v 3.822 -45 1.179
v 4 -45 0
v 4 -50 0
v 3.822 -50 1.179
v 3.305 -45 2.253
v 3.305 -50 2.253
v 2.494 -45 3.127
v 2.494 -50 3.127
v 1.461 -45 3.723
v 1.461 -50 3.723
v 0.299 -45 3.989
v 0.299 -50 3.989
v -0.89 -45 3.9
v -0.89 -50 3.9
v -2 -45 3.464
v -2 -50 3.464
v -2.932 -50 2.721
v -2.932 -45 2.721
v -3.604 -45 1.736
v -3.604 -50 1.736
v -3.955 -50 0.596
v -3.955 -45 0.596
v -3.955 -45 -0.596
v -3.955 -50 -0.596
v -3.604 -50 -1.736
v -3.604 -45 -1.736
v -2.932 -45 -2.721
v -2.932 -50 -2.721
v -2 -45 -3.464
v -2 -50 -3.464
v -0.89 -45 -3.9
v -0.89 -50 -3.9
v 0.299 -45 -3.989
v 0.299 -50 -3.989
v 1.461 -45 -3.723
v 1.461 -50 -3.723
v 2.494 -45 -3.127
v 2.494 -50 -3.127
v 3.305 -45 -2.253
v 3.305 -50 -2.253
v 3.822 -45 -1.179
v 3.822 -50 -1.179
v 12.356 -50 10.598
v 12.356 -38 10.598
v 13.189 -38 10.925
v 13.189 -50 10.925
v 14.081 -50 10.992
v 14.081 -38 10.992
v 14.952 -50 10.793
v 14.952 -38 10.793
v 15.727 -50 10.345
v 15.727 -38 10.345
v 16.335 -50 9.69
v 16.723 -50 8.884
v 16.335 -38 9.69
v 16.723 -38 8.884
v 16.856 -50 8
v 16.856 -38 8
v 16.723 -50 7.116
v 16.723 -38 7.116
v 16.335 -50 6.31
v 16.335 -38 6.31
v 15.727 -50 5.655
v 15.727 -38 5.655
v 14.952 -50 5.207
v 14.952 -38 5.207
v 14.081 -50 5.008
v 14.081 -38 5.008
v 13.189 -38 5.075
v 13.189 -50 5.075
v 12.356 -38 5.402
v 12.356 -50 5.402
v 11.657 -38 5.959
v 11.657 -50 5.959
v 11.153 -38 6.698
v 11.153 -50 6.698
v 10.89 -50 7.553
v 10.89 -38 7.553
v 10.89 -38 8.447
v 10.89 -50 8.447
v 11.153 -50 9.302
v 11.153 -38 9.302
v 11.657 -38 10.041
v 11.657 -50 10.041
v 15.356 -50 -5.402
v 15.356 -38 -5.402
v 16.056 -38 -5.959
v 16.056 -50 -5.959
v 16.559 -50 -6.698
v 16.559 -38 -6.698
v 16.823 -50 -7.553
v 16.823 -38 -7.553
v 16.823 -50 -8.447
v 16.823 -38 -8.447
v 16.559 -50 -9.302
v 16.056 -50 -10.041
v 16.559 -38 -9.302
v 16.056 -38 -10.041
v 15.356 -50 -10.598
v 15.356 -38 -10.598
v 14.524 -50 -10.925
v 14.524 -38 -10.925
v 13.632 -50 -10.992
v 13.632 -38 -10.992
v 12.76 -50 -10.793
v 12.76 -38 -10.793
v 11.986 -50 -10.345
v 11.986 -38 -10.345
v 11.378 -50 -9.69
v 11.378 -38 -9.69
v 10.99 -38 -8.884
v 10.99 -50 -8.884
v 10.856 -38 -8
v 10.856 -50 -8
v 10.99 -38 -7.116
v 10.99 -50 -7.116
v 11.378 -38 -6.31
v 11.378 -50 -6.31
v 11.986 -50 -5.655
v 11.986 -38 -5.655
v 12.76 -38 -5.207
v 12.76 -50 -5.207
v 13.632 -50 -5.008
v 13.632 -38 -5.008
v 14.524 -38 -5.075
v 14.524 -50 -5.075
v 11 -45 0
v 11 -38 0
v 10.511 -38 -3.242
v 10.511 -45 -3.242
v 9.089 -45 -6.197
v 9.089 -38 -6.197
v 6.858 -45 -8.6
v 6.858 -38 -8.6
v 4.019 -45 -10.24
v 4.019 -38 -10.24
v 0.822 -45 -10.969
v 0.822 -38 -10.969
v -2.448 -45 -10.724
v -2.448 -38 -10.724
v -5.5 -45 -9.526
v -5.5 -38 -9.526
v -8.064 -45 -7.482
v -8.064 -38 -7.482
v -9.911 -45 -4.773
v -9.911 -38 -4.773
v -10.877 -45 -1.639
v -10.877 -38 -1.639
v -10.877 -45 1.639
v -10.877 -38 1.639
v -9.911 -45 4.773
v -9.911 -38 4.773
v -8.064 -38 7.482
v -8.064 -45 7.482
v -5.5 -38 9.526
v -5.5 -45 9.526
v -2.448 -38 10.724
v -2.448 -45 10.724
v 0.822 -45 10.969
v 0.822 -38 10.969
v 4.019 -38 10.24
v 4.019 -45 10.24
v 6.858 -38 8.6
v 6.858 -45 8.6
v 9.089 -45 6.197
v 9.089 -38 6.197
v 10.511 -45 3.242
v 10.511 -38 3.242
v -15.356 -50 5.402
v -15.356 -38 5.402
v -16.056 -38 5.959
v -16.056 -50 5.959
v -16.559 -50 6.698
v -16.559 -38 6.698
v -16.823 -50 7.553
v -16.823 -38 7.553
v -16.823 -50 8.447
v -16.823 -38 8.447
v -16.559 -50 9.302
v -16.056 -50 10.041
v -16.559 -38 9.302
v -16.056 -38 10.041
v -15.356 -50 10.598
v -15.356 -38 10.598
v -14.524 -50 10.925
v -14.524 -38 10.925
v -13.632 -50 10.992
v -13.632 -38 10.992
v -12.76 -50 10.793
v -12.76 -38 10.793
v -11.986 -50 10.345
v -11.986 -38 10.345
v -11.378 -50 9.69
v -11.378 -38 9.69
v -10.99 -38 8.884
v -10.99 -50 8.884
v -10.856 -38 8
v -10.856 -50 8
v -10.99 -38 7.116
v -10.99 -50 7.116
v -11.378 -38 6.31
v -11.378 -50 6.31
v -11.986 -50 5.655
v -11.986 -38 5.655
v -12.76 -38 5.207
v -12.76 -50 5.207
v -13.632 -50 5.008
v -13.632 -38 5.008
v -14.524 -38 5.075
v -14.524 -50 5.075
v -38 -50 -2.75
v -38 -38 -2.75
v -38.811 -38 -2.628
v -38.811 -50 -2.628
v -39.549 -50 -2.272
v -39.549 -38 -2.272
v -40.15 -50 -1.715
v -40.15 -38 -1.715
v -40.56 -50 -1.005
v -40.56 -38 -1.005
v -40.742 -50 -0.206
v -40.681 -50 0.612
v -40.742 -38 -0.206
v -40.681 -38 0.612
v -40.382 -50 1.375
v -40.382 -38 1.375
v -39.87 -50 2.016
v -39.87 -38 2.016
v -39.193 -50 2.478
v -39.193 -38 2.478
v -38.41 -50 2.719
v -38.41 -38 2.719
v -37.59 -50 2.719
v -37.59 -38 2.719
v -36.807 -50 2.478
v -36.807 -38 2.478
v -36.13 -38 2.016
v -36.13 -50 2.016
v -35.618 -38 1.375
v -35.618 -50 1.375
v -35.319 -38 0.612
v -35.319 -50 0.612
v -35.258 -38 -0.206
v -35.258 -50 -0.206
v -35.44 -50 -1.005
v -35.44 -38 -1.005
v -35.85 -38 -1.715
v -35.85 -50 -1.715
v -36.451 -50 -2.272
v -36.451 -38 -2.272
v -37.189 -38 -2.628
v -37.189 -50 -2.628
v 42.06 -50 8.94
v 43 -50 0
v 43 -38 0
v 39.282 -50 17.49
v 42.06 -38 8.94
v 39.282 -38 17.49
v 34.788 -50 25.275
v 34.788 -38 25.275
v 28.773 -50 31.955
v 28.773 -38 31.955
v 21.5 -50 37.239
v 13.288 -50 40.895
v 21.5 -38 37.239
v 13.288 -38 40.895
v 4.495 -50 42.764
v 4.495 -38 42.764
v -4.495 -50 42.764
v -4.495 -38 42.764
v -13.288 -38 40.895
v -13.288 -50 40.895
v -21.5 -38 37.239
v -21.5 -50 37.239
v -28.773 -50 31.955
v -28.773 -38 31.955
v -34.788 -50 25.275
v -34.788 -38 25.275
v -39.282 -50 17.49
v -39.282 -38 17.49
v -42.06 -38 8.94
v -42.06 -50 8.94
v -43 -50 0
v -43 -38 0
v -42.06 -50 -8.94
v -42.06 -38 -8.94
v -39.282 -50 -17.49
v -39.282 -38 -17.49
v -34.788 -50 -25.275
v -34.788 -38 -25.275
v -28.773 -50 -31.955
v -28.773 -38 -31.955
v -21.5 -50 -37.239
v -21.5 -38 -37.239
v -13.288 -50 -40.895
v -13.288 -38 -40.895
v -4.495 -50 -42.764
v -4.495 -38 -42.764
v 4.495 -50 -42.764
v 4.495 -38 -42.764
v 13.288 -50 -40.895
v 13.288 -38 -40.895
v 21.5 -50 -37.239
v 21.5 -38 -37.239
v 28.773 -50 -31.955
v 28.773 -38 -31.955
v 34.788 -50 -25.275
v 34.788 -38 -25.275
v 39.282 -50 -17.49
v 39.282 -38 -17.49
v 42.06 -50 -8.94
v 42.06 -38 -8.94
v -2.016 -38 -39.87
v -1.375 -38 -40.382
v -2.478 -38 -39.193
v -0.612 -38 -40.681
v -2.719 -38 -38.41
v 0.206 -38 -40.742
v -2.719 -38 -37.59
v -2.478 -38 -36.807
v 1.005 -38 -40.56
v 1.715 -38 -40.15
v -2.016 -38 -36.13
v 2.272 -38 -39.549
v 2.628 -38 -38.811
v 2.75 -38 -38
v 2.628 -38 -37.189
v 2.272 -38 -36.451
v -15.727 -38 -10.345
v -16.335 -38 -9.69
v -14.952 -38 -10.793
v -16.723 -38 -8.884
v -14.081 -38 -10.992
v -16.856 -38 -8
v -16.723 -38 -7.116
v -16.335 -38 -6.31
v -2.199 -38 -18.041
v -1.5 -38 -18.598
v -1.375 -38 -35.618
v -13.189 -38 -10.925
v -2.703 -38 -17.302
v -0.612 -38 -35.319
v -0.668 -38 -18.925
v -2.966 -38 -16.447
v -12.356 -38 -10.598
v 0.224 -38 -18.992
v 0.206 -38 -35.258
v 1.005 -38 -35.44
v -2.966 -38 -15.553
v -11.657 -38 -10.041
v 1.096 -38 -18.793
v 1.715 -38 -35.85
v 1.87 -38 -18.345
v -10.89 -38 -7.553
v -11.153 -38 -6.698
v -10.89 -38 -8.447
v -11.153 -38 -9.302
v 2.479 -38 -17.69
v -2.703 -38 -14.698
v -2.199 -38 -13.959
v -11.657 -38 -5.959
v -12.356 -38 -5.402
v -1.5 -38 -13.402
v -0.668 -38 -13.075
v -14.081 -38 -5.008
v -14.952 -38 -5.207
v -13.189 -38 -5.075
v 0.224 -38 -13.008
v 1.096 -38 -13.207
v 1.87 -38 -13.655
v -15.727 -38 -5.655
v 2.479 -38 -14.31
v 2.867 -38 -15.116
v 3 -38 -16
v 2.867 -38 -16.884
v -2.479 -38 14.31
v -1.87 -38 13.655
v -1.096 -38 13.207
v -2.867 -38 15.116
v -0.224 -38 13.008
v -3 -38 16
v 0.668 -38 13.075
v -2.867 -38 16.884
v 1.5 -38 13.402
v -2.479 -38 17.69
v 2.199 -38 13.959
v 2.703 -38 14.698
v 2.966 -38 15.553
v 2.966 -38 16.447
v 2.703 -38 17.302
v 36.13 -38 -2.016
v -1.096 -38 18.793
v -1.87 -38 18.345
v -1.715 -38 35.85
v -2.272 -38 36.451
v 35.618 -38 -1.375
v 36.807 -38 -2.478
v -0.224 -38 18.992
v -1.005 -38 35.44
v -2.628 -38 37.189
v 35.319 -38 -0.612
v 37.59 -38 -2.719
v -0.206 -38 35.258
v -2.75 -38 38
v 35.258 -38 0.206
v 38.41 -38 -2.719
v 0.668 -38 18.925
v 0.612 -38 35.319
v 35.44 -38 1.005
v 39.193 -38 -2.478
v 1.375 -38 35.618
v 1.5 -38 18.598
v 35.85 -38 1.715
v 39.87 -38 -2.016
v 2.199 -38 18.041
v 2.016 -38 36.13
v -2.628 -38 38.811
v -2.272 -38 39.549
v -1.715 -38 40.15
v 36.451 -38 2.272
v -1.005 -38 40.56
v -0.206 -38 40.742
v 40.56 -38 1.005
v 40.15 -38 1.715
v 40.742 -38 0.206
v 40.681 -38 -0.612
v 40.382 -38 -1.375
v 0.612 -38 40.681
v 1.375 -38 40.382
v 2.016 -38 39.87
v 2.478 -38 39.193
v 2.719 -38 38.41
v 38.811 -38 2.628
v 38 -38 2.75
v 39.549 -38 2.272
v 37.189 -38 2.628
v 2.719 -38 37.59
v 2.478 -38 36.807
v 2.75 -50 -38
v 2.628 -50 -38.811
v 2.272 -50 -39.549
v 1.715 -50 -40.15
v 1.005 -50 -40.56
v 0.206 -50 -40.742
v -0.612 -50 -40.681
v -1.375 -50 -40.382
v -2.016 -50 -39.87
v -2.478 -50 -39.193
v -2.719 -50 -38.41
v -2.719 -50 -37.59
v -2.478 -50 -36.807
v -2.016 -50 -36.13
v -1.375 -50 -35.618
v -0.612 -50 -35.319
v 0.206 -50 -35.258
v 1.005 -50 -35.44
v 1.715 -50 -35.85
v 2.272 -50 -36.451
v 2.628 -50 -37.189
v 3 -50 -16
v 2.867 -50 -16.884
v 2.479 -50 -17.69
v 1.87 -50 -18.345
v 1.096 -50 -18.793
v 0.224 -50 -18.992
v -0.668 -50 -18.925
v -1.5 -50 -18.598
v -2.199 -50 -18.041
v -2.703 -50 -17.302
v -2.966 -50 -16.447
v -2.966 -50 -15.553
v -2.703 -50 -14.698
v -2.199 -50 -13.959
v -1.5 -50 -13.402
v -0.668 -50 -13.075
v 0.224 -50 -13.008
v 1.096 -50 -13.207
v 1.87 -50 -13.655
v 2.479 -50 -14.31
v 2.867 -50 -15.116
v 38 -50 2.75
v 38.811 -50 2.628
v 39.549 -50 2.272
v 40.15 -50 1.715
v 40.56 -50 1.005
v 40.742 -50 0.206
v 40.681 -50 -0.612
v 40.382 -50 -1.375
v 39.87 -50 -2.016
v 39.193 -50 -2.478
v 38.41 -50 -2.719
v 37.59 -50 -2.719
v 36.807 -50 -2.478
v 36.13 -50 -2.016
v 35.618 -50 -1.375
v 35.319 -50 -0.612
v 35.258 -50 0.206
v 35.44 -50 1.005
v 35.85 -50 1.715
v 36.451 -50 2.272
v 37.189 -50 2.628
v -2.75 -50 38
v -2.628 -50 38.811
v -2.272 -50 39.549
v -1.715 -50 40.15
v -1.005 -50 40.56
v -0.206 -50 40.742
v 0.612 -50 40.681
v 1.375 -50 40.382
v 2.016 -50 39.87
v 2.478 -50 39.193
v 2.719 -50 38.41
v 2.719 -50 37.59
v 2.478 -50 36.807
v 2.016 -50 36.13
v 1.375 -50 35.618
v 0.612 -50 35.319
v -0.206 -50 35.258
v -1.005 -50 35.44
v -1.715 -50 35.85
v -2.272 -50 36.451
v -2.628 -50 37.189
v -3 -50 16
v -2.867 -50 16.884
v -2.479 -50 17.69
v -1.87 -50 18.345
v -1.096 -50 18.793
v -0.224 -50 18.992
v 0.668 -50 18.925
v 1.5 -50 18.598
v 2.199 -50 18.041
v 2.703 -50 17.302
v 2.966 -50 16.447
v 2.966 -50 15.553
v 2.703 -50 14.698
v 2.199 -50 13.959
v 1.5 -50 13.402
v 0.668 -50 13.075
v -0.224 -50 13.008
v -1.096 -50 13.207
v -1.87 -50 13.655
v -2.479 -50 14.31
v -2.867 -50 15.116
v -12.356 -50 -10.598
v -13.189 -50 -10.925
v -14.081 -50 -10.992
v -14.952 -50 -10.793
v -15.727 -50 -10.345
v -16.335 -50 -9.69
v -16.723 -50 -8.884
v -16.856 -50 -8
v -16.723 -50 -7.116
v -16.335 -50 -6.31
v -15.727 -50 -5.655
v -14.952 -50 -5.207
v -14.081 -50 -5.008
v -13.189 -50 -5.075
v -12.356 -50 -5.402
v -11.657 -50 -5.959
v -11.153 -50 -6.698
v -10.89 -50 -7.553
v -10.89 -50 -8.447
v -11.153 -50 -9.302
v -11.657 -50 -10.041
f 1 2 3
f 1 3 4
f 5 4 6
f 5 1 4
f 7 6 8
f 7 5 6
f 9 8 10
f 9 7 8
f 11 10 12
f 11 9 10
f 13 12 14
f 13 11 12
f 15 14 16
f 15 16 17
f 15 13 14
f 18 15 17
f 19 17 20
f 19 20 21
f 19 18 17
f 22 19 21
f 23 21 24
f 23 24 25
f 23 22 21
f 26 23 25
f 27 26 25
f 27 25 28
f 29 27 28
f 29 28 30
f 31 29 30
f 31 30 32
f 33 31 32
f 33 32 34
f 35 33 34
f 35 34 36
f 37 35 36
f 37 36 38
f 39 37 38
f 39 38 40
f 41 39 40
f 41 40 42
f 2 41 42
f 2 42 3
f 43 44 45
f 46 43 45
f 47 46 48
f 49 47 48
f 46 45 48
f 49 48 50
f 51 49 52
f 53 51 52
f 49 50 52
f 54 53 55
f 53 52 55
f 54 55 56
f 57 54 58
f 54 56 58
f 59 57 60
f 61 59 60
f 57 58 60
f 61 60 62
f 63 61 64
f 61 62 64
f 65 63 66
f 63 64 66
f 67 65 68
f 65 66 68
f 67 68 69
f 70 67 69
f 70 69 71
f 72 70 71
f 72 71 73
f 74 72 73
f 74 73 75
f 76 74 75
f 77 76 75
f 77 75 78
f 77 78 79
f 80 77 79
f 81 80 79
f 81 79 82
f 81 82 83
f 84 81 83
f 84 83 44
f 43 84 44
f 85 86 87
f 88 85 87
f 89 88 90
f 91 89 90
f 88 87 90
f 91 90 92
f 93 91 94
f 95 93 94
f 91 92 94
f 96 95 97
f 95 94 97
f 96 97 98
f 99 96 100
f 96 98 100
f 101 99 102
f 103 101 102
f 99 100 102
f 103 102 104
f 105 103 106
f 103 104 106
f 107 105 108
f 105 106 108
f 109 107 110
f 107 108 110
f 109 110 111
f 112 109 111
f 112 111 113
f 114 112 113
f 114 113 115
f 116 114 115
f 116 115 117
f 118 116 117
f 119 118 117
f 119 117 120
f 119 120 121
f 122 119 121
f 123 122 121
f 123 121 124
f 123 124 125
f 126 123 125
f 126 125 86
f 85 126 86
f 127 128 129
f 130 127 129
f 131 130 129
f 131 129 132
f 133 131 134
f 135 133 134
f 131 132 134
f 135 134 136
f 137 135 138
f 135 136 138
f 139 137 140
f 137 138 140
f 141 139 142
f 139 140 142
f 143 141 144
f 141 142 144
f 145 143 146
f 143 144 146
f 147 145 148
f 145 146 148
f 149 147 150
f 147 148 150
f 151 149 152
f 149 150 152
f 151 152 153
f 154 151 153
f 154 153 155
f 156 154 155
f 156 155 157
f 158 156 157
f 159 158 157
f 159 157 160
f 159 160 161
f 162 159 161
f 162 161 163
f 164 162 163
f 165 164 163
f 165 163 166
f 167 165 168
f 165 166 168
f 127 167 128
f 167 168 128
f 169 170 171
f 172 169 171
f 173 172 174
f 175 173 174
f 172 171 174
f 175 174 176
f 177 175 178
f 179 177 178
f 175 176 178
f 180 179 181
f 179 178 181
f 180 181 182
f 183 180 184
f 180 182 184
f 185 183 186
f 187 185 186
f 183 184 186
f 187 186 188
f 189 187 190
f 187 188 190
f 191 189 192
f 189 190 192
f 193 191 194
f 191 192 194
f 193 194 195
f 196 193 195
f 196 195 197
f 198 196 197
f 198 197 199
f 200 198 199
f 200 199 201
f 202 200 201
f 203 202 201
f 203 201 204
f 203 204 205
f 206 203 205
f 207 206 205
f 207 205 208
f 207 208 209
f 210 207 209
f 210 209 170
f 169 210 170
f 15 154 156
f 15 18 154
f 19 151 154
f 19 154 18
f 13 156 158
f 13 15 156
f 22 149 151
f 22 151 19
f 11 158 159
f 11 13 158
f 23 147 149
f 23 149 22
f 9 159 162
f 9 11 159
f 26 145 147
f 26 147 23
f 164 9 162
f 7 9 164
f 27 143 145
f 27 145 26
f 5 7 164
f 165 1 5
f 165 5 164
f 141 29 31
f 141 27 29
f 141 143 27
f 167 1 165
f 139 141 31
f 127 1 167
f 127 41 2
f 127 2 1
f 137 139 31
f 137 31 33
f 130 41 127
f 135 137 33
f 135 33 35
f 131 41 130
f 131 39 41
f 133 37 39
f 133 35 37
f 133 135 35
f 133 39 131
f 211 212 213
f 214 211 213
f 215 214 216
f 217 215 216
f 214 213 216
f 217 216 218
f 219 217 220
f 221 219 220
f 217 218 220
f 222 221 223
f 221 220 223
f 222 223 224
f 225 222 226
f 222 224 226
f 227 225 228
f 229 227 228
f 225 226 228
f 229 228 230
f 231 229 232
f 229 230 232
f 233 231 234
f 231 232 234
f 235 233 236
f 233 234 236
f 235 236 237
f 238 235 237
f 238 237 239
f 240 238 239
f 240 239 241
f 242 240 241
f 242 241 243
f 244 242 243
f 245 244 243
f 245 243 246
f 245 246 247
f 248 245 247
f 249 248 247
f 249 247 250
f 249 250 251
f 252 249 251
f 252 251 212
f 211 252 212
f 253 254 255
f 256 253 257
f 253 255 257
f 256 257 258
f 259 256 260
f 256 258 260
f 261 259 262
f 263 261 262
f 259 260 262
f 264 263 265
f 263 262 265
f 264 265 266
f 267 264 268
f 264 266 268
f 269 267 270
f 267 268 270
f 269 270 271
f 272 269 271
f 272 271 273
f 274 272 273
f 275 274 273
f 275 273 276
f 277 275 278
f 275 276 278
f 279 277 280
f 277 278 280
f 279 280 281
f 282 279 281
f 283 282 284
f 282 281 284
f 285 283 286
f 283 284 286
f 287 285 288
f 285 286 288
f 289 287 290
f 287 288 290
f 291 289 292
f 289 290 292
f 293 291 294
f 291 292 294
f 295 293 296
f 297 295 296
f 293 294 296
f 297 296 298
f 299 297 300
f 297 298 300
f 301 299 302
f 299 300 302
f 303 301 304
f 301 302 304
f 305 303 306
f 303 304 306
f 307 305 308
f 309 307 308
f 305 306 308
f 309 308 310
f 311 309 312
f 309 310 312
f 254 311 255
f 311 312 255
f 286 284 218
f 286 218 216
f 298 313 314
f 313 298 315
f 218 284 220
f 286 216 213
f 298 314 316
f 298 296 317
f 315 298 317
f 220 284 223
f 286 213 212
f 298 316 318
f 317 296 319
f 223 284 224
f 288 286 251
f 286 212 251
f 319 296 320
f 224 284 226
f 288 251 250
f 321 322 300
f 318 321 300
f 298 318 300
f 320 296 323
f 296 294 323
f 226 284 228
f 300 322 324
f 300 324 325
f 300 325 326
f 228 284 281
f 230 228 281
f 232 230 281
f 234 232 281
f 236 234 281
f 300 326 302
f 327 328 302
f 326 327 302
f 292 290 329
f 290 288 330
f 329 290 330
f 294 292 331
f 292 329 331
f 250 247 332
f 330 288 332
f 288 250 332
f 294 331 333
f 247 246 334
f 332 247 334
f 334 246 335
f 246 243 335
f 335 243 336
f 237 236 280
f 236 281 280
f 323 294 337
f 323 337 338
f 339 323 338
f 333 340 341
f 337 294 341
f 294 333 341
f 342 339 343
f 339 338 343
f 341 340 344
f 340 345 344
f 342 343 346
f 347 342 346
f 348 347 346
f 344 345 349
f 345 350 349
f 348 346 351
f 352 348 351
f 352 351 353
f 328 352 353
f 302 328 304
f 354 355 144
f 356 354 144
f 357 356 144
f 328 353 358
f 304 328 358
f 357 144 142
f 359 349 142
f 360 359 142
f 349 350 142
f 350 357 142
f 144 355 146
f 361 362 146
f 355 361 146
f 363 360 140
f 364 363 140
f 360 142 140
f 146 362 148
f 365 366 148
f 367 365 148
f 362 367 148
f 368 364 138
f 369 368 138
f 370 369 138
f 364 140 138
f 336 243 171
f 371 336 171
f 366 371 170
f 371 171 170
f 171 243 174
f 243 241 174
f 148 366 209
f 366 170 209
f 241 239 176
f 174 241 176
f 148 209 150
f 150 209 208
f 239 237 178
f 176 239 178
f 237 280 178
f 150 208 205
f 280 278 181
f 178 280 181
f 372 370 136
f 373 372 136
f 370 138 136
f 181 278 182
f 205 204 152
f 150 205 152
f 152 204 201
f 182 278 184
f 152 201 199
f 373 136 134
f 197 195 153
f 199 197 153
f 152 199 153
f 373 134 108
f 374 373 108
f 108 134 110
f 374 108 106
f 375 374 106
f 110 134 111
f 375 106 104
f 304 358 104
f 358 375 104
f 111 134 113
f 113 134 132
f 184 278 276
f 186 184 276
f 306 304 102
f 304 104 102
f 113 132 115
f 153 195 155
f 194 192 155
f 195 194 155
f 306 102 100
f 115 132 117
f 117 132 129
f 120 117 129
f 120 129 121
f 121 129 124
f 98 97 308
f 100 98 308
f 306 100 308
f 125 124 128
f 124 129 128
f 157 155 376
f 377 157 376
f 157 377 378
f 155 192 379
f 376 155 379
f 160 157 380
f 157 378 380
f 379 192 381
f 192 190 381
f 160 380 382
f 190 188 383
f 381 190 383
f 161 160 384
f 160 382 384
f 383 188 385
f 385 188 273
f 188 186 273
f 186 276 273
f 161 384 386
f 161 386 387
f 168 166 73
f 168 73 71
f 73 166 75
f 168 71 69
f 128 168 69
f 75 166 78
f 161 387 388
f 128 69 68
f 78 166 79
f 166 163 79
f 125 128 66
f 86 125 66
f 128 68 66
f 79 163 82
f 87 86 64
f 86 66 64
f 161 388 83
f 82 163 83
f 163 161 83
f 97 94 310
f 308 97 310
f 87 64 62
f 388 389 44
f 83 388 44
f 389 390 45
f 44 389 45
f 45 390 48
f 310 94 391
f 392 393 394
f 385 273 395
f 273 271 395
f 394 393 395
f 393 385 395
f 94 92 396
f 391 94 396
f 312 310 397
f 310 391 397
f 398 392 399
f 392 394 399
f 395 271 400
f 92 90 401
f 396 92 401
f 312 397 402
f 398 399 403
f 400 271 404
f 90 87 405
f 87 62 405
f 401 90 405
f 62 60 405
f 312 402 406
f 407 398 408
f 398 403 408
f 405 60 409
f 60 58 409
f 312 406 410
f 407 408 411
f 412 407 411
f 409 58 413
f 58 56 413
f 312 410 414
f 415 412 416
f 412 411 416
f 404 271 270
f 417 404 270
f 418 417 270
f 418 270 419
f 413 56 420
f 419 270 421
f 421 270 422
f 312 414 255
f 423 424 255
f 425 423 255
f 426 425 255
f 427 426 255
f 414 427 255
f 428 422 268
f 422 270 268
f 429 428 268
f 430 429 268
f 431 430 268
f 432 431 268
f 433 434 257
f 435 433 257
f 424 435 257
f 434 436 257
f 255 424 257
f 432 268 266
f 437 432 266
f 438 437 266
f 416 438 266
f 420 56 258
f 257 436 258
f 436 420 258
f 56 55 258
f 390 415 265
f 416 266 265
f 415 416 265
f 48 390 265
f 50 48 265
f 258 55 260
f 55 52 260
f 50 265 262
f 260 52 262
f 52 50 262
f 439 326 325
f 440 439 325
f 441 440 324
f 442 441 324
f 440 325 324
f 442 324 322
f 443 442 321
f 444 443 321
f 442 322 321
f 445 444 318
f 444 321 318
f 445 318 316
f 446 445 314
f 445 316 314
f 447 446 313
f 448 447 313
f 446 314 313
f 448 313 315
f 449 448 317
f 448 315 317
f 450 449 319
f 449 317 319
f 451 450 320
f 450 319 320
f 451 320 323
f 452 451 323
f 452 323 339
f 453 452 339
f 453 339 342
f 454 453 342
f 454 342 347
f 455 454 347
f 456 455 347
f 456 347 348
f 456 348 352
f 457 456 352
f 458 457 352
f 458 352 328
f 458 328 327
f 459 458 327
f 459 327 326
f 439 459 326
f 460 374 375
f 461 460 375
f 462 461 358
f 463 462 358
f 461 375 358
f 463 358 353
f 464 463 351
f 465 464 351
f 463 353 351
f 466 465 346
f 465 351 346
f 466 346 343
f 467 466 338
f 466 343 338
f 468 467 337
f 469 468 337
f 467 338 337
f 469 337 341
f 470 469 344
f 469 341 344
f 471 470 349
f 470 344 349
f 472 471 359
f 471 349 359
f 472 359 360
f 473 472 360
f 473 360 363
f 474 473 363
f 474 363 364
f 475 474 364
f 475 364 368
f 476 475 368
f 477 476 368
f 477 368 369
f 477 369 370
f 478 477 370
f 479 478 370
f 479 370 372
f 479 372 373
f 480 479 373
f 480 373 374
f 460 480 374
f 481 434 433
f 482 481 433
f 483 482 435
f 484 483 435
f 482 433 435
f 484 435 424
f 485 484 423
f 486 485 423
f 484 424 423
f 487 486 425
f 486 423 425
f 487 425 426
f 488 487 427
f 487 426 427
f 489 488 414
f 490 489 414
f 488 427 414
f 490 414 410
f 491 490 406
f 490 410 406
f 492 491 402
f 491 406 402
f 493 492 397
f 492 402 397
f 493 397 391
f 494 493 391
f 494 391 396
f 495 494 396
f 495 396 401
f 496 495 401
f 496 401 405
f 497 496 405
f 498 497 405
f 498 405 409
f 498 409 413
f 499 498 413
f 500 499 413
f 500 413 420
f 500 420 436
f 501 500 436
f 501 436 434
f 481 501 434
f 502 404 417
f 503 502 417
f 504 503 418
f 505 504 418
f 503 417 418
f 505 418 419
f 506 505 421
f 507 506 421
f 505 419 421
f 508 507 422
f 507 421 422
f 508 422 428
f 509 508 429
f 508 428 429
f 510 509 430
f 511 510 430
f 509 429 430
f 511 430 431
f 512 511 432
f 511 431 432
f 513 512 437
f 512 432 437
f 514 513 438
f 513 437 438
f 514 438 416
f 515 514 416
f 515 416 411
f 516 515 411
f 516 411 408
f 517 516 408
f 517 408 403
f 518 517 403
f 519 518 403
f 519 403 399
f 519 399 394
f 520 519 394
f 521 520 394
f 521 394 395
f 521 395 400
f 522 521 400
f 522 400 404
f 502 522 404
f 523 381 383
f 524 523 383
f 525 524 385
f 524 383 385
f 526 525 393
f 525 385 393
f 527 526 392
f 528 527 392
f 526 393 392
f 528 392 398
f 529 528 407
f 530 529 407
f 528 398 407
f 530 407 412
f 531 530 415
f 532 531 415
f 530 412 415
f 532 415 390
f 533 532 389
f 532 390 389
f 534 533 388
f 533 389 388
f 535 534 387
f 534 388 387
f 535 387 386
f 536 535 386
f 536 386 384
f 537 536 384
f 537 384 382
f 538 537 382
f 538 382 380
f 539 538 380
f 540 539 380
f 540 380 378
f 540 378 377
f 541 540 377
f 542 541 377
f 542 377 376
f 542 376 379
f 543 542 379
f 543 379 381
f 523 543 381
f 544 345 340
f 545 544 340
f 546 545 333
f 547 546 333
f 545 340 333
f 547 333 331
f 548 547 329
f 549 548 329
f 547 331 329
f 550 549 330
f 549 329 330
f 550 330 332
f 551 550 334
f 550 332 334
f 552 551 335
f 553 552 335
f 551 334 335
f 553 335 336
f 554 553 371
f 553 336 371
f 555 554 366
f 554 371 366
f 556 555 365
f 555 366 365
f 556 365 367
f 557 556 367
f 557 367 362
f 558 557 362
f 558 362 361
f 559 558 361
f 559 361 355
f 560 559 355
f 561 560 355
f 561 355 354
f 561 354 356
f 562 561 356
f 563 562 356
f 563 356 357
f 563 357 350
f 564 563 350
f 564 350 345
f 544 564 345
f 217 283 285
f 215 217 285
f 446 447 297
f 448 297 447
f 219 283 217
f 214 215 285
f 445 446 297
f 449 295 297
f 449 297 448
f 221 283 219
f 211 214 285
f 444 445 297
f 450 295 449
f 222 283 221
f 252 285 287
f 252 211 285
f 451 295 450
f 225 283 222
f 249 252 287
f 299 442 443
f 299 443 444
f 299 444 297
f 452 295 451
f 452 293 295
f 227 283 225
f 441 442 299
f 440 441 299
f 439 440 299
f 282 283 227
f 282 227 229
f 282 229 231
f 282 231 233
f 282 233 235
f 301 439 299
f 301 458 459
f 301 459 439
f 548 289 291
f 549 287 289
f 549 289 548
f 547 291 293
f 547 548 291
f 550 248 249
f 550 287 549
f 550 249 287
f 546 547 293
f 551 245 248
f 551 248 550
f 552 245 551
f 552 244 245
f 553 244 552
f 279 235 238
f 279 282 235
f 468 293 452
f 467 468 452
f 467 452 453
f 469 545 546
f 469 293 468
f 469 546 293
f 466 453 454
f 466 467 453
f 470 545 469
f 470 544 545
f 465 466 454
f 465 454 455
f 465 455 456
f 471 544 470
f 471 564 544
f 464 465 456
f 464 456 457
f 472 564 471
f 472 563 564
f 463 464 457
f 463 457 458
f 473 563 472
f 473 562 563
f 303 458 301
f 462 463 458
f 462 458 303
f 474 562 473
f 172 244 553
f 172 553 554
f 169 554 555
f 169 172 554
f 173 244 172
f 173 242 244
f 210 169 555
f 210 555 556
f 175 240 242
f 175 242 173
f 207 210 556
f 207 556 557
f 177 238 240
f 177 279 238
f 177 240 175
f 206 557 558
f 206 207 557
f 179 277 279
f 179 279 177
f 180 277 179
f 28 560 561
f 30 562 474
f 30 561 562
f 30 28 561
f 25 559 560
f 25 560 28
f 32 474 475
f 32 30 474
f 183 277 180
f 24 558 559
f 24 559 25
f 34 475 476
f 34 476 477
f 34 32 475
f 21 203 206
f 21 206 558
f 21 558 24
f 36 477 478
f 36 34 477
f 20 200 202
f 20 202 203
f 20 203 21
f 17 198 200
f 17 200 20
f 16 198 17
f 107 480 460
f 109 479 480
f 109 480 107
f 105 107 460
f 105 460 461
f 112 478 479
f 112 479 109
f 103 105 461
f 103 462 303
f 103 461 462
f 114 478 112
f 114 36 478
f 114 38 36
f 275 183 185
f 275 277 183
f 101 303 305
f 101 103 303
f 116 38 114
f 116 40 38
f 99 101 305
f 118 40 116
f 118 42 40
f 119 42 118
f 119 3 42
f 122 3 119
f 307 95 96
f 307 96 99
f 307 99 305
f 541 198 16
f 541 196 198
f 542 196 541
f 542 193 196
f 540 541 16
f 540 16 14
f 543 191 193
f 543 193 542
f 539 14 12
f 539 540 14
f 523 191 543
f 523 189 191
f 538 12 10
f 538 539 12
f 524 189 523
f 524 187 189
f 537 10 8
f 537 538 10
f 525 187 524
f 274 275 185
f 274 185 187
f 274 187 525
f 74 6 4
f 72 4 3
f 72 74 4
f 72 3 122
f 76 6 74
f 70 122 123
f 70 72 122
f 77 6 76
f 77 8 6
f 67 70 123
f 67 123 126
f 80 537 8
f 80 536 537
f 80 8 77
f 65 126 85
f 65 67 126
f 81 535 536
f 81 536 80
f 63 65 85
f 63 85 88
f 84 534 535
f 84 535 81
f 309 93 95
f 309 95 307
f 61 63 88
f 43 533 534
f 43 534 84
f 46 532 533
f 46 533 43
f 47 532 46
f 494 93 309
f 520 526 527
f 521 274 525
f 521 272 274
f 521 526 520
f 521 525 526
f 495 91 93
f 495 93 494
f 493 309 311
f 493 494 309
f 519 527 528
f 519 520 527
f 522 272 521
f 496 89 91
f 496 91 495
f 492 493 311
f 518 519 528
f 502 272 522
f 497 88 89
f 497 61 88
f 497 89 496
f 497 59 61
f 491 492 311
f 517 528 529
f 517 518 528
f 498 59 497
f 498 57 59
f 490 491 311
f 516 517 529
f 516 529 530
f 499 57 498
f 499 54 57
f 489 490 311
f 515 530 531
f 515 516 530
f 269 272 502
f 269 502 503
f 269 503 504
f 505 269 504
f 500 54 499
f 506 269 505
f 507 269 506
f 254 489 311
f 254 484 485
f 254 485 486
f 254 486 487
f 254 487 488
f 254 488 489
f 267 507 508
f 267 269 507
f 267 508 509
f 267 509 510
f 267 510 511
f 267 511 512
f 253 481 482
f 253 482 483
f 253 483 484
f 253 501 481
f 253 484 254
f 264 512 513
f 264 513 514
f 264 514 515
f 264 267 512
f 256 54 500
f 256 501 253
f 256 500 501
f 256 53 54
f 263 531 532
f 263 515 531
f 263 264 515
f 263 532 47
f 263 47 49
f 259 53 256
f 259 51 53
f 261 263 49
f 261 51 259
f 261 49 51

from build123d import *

# Parameters (mm, degrees)
SKETCH008_R           = 43
SKETCH008_R_2         = 4
PAD002_DEPTH          = 12
SKETCH009_R           = 11
POCKET002_DEPTH       = 7
SKETCH010_R           = 3
POCKET003_DEPTH       = 256.426858
POLARPATTERN001_COUNT = 6
SKETCH011_R           = 2.75
POCKET004_DEPTH       = 256.426858
POLARPATTERN002_COUNT = 4


with BuildPart() as part:
    # Sketch008 (on Face1 of ShapeBinder003) → Pad002 (new body)
    with BuildSketch(Plane.XZ.offset(8)):
        Circle(SKETCH008_R)
        Circle(SKETCH008_R_2, mode=Mode.SUBTRACT)
    extrude(amount=PAD002_DEPTH)

    # Sketch009 (on Face3 of Pad002) → Pocket002 (cut)
    with BuildSketch(Plane(origin=(0, -8, 0), x_dir=(1, 0, 0), z_dir=(0, 1, 0))):
        Circle(SKETCH009_R)
    extrude(amount=-POCKET002_DEPTH, mode=Mode.SUBTRACT)

    # Sketch010 (on Face2 of Pocket002) → Pocket003 (cut, through all)
    with BuildSketch(Plane(origin=(0, -8, 0), x_dir=(1, 0, 0), z_dir=(0, 1, 0))):
        with Locations((0, 16)):
            Circle(SKETCH010_R)
    pocket003 = extrude(amount=-POCKET003_DEPTH, mode=Mode.SUBTRACT)

    # PolarPattern001: Pocket003 ×6 about axis
    polarpattern001_axis = Axis((0, -8, 0), (0, 1, 0))
    for i in range(1, POLARPATTERN001_COUNT):
        add(pocket003.rotate(polarpattern001_axis, i * 360 / POLARPATTERN001_COUNT), mode=Mode.SUBTRACT)

    # Sketch011 (on Face2 of PolarPattern001) → Pocket004 (cut, through all)
    with BuildSketch(Plane(origin=(0, -8, 0), x_dir=(1, 0, 0), z_dir=(0, 1, 0))):
        with Locations((0, 38)):
            Circle(SKETCH011_R)
    pocket004 = extrude(amount=-POCKET004_DEPTH, mode=Mode.SUBTRACT)

    # PolarPattern002: Pocket004 ×4 about axis
    polarpattern002_axis = Axis((0, -8, 0), (0, 1, 0))
    for i in range(1, POLARPATTERN002_COUNT):
        add(pocket004.rotate(polarpattern002_axis, i * 360 / POLARPATTERN002_COUNT), mode=Mode.SUBTRACT)


with BuildPart() as part_1:
    # Body003 placement: moved
    add(part.part.moved(Location((0, -30, 0))))


solid = part_1.part
